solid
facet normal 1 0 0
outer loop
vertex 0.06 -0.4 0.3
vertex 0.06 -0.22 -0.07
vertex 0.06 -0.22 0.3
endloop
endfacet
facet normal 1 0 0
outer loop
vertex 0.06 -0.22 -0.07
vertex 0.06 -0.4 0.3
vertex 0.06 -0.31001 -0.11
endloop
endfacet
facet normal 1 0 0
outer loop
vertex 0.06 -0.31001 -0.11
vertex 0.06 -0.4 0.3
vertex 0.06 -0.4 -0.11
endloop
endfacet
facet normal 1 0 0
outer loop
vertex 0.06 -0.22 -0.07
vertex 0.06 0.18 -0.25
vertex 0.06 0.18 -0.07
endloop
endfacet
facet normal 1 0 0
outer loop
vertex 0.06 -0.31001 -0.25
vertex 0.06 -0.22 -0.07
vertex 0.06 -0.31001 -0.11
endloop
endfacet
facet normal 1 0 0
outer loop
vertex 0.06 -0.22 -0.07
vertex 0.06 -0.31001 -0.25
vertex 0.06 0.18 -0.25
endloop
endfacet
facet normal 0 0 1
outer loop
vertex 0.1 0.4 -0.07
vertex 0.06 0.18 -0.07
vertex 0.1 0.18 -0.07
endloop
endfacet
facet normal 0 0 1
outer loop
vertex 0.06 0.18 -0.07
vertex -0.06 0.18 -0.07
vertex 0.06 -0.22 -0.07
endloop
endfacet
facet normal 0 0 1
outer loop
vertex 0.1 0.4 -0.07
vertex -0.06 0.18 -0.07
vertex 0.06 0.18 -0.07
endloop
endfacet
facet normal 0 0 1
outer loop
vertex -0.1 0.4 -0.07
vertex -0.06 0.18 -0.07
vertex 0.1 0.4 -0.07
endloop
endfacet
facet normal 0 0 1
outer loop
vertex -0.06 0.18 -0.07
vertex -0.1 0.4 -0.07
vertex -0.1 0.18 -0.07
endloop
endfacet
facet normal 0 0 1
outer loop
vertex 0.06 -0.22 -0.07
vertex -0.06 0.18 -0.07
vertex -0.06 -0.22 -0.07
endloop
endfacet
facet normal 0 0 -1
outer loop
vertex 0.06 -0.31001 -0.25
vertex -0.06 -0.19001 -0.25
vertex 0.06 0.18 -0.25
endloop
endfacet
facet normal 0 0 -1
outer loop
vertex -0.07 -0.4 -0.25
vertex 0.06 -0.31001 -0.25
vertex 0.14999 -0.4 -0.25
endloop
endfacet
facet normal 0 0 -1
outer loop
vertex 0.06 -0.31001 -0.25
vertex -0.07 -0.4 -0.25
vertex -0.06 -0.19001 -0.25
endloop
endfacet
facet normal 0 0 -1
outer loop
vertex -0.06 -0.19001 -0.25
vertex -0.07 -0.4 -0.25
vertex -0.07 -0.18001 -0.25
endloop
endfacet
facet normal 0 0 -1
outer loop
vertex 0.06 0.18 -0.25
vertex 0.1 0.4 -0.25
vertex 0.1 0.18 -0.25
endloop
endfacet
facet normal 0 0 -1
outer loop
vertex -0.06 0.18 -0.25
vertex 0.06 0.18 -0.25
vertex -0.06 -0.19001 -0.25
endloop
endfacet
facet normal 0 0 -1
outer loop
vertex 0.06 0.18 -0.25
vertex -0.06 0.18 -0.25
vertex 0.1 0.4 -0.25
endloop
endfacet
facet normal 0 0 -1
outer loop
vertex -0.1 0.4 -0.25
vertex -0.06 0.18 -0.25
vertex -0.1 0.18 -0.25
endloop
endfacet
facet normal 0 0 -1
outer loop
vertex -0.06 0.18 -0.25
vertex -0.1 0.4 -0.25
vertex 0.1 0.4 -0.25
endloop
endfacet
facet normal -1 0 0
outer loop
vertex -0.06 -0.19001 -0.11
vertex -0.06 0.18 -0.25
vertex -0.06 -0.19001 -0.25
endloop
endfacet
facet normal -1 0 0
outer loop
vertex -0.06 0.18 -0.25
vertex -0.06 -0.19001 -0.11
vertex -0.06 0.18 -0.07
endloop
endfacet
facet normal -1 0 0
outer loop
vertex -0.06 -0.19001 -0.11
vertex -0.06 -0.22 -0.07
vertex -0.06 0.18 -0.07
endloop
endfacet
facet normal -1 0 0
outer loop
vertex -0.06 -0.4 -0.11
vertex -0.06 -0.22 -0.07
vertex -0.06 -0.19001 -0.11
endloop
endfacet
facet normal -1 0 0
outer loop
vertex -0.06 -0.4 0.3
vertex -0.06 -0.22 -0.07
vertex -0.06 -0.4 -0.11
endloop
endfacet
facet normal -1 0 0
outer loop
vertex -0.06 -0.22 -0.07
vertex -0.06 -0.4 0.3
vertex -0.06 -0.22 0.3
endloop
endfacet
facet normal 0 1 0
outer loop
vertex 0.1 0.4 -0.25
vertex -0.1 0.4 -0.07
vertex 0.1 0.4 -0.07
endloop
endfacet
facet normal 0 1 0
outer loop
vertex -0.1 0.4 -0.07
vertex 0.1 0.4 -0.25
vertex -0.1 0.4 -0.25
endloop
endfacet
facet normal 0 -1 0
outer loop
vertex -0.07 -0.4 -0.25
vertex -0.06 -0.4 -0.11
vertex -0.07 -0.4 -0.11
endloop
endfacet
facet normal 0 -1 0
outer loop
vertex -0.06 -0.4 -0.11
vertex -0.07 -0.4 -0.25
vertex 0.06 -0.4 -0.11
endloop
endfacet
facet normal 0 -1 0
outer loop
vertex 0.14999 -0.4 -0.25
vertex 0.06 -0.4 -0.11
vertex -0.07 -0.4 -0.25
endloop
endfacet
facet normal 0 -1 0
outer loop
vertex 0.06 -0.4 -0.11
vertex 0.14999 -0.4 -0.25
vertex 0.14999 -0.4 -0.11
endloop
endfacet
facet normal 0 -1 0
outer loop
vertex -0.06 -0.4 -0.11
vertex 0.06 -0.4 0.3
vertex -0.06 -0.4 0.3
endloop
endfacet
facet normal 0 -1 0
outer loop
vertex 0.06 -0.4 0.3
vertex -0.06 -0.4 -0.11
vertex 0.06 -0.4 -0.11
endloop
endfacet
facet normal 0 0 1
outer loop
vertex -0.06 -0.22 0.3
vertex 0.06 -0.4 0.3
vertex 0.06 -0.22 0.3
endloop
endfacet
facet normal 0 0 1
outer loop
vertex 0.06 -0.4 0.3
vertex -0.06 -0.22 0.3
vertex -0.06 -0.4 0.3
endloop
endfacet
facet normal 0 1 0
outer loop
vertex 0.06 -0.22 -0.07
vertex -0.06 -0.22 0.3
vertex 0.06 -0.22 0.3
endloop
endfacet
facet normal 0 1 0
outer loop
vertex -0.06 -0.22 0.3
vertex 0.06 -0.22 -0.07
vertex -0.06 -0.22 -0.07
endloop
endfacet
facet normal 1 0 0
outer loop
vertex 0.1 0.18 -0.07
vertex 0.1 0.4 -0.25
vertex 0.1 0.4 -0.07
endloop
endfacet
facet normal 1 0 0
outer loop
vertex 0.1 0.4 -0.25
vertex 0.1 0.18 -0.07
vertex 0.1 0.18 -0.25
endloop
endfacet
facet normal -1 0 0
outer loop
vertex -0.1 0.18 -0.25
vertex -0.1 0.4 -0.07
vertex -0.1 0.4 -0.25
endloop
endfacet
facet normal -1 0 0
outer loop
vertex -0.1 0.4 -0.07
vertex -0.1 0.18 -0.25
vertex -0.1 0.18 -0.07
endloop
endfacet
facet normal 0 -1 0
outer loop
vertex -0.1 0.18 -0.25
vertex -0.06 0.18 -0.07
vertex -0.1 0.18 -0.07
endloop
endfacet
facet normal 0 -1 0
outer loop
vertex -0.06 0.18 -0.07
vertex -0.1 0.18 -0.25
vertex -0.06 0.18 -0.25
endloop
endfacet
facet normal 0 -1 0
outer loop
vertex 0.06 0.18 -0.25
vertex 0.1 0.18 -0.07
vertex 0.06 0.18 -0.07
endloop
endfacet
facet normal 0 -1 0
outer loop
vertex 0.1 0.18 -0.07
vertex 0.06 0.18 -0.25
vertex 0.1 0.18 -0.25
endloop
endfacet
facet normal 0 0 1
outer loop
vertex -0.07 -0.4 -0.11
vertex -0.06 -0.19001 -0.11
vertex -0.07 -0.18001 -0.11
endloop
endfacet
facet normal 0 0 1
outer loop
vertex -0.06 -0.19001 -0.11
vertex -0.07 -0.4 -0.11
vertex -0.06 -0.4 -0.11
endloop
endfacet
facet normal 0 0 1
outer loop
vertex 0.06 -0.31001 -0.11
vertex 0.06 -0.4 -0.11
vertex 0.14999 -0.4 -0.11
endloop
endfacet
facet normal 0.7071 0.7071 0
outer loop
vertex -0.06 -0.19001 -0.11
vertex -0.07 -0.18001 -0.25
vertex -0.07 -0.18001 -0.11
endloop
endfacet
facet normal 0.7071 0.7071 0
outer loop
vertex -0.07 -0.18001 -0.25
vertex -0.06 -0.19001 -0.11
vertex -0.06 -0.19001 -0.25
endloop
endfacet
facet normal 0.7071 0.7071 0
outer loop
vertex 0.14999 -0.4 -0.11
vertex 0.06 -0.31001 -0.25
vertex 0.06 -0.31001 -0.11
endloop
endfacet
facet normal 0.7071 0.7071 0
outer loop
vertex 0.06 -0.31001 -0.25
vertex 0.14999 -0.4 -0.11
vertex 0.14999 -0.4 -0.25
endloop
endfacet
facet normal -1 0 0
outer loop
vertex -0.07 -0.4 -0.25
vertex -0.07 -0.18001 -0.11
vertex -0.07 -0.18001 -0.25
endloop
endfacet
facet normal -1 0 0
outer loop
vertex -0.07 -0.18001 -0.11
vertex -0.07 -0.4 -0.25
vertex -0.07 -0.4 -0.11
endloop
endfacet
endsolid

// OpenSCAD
$fn=64;

sx=0.4;
sy=0.8;
sz=0.5;

t=0.12;          // member thickness (x)
w=0.18;          // member width (z)
h=sz;            // overall height (z)

Lh=sy;           // horizontal arm length along +Y
Lv=0.55;         // vertical arm length along +Z

thick_len=0.22;  // local thickening length at far end of horizontal arm
thick_add=0.08;  // added thickness in X for thickened region

gus_y=0.22;      // gusset extent along Y
gus_z=0.22;      // gusset extent along Z
gus_x=t+0.02;    // gusset thickness in X

module arm_y(len, xth=t, zth=w){
    translate([-xth/2, 0, 0])
        cube([xth, len, zth], center=false);
}

module arm_z(len, xth=t, zth=w){
    translate([-xth/2, 0, 0])
        cube([xth, zth, len], center=false);
}

module gusset(){
    translate([-gus_x/2, 0, 0])
    linear_extrude(height=gus_x, center=false, convexity=10)
        polygon(points=[[0,0],[gus_y,0],[0,gus_z]]);
}

module bracket(){
    union(){
        arm_y(Lh, t, w);
        arm_z(Lv, t, w);

        translate([0, Lh-thick_len, 0])
            arm_y(thick_len, t+thick_add, w);

        gusset();
    }
}

translate([0, -sy/2, -sz/2])
    bracket();
